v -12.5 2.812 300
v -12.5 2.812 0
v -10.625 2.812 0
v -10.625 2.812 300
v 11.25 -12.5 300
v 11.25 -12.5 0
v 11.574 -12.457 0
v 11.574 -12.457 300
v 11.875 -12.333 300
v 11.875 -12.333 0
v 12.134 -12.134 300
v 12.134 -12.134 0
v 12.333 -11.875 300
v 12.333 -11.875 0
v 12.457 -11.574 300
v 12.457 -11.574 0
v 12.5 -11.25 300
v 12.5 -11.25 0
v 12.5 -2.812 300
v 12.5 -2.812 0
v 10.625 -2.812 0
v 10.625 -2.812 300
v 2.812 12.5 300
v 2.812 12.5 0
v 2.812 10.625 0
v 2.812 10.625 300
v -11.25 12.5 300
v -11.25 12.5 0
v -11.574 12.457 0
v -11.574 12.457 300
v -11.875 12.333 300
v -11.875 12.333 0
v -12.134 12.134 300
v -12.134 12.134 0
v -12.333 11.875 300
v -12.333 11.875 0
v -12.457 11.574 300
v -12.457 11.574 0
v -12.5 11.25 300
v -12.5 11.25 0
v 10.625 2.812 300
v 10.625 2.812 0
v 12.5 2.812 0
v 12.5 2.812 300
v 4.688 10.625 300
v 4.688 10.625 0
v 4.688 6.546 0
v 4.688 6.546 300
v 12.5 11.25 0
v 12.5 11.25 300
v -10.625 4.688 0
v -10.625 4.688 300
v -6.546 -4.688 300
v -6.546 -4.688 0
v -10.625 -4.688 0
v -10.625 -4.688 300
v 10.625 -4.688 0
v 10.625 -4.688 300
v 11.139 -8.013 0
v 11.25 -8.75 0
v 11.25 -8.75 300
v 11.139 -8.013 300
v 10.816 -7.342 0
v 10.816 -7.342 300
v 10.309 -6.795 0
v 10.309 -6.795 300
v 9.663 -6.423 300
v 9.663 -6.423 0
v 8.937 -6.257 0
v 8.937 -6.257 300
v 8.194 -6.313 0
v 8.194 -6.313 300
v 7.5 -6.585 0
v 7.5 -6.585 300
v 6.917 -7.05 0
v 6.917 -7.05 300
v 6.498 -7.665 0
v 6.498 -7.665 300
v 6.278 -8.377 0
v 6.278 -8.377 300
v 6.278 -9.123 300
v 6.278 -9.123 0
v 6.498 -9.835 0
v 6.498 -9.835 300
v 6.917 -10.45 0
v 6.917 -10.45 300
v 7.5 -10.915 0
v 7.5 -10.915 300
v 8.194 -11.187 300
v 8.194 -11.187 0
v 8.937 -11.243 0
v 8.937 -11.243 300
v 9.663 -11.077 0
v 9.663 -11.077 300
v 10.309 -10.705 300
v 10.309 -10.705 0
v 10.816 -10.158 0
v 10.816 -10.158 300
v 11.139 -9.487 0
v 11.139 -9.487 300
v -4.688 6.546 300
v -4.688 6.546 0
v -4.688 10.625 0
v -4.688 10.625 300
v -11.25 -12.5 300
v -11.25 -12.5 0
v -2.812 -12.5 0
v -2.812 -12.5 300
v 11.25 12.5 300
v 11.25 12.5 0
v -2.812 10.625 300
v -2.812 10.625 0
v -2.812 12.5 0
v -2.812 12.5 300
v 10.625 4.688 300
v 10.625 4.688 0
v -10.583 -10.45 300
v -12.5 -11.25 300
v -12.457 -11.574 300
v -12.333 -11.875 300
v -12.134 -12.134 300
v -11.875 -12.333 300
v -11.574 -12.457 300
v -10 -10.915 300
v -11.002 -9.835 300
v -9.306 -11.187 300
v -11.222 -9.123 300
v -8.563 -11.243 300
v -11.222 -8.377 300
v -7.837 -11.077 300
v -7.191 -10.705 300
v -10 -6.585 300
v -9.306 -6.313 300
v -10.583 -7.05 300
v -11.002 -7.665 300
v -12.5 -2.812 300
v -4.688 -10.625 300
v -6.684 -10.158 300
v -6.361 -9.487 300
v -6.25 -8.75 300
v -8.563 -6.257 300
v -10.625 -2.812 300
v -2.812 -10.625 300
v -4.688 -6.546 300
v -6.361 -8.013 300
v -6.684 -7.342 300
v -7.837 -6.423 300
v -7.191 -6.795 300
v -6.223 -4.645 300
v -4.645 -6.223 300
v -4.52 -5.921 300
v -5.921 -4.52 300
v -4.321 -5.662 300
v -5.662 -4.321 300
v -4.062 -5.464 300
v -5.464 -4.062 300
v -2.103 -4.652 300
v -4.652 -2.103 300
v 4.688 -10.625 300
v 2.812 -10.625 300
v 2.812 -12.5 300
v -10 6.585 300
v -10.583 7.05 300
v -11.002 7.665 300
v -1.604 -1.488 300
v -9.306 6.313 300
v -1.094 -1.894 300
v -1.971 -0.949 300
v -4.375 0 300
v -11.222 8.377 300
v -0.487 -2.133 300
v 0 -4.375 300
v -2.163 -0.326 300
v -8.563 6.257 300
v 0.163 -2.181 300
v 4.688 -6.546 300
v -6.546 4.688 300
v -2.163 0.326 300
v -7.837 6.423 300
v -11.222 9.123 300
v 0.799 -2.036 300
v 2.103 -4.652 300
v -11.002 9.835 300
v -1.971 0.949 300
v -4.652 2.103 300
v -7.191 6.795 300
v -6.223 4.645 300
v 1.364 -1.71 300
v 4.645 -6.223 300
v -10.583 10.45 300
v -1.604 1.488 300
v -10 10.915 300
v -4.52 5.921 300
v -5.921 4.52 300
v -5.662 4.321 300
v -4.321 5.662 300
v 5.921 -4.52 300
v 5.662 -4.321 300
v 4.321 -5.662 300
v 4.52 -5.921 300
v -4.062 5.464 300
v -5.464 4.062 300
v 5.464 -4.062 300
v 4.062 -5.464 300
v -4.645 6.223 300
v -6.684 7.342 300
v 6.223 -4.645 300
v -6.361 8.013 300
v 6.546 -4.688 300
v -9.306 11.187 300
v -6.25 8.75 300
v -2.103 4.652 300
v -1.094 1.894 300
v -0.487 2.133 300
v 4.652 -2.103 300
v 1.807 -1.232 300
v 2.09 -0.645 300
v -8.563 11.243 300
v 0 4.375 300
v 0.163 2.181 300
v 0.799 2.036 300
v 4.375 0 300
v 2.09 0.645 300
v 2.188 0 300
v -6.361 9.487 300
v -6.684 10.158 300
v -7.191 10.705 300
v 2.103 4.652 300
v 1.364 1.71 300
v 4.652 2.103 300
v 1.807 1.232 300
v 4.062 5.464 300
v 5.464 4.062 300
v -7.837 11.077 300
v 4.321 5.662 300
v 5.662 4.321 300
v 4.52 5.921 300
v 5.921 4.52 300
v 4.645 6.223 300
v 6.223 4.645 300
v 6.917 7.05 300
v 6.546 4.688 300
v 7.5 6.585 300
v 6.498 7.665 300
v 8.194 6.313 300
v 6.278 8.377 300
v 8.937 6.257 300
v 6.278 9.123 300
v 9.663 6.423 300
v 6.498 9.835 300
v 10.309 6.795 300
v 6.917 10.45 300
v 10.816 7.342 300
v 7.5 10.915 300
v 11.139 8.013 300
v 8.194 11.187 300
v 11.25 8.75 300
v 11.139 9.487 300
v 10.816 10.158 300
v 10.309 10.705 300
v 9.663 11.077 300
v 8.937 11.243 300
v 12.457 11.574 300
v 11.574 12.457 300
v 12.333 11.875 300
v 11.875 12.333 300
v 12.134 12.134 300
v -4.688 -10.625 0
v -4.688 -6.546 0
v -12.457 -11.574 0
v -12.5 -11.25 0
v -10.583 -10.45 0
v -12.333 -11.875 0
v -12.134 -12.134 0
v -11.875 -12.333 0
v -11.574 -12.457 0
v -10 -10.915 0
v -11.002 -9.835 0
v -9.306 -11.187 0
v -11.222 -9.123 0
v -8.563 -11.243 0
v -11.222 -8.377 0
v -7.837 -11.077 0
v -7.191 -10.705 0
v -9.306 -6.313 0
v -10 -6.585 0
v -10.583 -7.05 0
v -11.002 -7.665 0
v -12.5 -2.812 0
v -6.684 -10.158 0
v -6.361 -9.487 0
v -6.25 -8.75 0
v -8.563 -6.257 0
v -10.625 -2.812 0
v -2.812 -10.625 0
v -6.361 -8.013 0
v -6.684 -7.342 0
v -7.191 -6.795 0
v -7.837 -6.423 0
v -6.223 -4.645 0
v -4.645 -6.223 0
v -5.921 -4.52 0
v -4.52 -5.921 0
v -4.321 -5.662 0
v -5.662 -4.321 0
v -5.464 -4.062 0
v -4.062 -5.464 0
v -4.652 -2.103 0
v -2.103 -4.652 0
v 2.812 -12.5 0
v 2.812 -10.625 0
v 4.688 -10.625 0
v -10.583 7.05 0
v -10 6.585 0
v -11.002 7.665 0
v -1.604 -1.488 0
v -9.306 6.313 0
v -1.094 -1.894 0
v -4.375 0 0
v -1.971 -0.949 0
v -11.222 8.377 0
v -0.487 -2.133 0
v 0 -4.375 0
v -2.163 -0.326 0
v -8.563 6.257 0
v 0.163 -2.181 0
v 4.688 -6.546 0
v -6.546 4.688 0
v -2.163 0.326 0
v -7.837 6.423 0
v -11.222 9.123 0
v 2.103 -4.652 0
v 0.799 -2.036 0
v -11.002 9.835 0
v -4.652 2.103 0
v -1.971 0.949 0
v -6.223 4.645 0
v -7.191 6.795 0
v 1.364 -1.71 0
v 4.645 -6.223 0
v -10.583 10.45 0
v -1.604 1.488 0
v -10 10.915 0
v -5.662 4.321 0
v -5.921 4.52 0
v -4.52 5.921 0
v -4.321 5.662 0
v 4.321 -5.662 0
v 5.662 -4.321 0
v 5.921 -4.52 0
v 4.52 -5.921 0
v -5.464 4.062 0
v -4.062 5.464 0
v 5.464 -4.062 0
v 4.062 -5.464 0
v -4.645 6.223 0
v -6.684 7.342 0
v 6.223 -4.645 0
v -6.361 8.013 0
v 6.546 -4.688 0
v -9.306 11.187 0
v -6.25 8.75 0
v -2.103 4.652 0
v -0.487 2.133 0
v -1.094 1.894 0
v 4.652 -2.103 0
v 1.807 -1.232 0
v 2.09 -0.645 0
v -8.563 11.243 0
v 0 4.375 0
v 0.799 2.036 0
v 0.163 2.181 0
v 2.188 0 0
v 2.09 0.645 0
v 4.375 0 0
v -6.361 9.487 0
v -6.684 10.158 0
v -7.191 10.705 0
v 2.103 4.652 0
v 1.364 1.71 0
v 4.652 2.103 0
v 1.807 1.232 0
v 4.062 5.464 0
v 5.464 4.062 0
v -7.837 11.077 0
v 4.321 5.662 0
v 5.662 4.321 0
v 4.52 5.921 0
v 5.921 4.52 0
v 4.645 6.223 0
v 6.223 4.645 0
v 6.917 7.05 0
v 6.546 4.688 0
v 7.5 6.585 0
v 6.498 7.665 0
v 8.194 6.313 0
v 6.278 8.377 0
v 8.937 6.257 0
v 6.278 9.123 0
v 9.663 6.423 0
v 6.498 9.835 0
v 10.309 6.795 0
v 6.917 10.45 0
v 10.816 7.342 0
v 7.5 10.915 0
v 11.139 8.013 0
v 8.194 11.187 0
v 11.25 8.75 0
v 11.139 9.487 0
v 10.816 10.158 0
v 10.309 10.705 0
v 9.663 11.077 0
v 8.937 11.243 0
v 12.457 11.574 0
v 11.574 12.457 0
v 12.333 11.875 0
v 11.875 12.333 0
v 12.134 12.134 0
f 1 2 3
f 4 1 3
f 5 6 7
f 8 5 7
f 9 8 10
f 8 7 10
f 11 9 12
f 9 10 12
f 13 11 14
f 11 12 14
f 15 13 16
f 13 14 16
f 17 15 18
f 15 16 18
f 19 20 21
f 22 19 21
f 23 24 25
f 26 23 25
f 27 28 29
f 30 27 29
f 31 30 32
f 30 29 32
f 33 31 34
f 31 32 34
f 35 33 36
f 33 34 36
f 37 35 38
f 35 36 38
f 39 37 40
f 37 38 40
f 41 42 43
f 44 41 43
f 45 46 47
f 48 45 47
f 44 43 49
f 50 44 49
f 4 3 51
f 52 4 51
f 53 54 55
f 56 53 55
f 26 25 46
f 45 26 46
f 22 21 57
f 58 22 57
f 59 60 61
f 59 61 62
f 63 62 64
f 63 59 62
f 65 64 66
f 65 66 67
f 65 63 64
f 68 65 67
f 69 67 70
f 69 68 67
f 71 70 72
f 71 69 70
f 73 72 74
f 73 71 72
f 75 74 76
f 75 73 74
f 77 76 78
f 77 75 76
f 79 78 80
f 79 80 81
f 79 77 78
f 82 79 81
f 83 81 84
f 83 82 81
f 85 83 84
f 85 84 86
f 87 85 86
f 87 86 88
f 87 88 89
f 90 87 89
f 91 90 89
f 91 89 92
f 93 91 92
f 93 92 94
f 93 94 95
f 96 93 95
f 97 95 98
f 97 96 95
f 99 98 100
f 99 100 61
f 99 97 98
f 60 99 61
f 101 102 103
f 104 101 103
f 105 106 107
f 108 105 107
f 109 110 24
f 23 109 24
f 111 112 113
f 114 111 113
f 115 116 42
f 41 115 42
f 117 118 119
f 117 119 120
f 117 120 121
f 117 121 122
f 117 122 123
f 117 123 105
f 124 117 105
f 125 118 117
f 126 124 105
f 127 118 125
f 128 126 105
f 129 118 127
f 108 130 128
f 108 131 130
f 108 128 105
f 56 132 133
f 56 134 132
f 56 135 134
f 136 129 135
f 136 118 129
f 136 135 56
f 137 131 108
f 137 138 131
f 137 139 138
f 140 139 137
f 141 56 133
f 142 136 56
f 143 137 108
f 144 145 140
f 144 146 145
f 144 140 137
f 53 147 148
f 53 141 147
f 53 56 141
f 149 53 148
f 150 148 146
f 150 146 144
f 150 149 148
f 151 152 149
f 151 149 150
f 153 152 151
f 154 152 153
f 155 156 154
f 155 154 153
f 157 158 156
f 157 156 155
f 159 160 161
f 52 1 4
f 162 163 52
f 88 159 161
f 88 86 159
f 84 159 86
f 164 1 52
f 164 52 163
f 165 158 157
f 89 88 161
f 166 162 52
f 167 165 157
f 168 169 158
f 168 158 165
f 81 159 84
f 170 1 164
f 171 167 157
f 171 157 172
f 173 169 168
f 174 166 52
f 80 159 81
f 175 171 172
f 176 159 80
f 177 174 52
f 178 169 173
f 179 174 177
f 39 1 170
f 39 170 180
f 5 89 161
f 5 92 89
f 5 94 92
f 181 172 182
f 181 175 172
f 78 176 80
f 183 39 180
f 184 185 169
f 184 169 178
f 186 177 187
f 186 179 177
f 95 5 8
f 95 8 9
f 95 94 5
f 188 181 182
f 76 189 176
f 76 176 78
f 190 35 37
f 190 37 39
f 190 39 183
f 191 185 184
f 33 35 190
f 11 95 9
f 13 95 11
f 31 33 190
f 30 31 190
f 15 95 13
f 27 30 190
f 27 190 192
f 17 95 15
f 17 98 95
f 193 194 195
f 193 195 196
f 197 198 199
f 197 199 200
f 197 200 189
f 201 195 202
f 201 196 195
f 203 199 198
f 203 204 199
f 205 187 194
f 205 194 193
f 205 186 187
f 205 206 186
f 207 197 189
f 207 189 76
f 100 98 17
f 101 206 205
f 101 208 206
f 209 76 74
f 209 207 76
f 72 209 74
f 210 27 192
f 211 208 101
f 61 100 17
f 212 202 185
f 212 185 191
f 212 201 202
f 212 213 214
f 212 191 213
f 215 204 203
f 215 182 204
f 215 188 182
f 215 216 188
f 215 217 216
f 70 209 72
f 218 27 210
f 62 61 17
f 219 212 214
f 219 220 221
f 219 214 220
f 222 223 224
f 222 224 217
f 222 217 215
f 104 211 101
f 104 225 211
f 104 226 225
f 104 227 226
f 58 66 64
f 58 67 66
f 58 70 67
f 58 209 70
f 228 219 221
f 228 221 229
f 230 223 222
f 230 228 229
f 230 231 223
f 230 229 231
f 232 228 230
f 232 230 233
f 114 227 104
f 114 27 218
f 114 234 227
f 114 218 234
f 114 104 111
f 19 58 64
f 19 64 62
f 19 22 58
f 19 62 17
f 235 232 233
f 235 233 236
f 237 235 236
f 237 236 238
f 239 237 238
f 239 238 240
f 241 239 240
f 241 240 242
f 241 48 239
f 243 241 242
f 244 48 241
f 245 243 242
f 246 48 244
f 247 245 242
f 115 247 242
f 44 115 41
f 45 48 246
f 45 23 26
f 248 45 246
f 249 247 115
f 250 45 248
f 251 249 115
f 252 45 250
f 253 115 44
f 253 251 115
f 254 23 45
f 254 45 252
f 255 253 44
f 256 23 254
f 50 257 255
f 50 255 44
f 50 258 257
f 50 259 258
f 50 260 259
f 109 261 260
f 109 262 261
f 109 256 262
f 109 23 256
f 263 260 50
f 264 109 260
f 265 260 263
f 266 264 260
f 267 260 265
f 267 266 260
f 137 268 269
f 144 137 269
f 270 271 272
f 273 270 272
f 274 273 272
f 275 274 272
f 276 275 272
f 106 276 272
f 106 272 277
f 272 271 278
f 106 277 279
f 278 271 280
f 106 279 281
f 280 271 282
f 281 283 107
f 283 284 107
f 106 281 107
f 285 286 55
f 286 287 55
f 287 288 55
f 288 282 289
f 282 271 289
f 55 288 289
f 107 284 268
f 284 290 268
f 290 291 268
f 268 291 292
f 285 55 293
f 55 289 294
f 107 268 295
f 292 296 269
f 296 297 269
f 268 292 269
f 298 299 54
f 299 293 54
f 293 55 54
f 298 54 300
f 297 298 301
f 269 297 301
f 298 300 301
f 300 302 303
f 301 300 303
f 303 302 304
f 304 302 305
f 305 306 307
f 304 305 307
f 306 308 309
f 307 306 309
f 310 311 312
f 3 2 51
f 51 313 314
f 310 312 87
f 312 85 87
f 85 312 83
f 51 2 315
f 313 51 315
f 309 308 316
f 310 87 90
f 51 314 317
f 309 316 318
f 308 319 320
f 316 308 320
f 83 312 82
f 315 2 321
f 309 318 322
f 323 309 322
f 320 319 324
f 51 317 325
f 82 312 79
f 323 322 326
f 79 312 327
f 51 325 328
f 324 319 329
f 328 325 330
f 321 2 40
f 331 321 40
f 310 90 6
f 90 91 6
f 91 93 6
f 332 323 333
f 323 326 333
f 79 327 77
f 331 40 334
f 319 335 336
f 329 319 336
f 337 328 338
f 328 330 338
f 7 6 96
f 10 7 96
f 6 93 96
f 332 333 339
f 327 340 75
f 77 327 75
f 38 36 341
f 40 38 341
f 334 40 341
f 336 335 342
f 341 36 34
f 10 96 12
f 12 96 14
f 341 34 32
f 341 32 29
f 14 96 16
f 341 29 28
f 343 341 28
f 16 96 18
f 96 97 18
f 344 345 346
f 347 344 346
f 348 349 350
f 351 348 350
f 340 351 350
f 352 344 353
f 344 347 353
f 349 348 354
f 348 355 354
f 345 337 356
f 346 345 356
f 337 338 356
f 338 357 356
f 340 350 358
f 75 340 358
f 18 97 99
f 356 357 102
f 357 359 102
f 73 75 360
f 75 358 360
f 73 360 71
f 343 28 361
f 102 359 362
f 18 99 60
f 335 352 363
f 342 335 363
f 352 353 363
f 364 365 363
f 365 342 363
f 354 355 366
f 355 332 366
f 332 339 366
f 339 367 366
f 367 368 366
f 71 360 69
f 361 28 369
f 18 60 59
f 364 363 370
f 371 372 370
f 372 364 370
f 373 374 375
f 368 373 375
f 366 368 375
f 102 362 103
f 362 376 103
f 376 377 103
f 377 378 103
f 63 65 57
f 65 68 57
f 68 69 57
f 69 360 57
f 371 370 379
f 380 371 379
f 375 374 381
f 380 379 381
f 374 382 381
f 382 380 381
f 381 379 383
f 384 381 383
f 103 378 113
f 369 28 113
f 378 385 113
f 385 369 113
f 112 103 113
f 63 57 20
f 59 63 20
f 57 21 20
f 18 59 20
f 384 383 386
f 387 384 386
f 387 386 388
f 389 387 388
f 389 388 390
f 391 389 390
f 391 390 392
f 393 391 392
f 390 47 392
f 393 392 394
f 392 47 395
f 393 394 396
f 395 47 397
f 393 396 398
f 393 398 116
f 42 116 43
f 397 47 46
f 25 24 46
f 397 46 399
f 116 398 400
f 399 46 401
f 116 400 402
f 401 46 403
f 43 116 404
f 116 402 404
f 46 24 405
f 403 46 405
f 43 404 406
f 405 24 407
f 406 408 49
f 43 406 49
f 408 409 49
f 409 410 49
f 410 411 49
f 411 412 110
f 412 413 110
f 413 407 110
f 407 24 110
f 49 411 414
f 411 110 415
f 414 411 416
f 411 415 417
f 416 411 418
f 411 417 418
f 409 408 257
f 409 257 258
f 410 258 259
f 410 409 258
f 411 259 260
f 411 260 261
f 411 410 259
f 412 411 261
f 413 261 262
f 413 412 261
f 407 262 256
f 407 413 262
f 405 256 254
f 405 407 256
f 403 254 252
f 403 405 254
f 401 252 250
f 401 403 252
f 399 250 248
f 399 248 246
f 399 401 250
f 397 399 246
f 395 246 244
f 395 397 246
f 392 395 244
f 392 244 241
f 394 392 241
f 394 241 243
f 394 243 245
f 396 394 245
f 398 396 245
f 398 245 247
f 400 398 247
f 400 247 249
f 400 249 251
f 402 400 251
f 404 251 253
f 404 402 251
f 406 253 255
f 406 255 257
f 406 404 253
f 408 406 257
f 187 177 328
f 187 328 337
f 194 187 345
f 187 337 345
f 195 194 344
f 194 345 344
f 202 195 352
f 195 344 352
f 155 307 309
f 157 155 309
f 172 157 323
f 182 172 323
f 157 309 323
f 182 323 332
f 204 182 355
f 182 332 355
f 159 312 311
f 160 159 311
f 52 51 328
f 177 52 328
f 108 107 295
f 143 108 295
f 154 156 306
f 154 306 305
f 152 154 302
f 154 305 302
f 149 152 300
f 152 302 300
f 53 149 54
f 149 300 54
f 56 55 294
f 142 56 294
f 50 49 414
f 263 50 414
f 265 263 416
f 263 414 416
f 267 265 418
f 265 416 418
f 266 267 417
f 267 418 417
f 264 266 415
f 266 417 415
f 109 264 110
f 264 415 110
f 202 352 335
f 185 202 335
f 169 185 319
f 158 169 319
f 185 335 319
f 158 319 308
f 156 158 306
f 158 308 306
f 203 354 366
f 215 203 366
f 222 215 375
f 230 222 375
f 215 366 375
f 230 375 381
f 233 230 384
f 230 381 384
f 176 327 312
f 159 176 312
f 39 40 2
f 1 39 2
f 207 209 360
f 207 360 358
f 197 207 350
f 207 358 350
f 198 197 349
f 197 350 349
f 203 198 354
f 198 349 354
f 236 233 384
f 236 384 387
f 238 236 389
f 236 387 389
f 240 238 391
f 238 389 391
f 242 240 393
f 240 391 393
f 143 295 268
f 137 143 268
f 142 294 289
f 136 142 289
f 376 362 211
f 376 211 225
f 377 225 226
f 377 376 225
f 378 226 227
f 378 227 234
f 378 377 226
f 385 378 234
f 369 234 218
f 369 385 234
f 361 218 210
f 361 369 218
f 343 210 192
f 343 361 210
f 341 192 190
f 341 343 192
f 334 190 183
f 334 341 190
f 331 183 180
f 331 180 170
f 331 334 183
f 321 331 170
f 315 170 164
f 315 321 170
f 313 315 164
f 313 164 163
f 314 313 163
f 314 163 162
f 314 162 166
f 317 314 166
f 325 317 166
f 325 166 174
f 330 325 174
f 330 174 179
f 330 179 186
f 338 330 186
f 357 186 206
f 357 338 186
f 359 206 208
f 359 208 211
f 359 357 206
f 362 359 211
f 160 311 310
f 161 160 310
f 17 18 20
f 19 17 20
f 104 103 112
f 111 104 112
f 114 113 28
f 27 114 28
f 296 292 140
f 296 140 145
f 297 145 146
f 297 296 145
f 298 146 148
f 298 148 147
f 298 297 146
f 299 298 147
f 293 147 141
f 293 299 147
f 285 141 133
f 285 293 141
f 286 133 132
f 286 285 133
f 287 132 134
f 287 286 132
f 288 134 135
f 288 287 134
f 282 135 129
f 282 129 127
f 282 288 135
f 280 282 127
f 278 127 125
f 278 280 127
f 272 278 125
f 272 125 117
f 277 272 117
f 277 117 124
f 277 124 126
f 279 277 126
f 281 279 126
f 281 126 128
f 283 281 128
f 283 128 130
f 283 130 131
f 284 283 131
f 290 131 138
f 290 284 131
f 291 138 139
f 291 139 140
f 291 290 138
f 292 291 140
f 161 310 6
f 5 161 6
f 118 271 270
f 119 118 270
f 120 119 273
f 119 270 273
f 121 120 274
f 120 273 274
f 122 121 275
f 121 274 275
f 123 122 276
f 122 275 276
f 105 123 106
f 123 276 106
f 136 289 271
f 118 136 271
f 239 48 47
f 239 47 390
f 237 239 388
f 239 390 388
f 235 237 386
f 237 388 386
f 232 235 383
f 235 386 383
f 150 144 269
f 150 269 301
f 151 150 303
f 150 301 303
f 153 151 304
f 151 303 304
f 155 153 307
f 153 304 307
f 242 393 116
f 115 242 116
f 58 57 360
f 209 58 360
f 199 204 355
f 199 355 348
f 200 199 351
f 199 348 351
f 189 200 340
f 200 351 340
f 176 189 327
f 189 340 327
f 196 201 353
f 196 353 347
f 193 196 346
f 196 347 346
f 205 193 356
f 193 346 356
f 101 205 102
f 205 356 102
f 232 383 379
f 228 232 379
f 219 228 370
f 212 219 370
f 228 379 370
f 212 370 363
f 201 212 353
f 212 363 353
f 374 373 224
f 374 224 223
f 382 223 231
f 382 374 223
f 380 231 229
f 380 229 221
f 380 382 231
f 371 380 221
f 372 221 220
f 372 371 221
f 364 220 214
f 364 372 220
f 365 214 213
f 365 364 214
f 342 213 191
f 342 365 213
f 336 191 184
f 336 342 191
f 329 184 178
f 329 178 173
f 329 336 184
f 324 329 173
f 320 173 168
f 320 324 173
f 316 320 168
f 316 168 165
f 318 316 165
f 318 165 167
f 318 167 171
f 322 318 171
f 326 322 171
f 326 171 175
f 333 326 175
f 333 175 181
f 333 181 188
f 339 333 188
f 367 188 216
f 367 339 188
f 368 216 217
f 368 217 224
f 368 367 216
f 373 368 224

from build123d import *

# Parameters (mm, degrees)
SKETCH1_R           = 2.5
SKETCH1_R_2         = 2.1875
BOSS_EXTRUDE1_DEPTH = 300


with BuildPart() as part:
    # Sketch1 → Boss-Extrude1 (new body)
    with BuildSketch(Plane.XY):
        with BuildLine():
            Line((-12.5, 11.25), (-12.5, 2.8125))
            Line((-12.5, 2.8125), (-10.625, 2.8125))
            Line((-10.625, 2.8125), (-10.625, 4.6875))
            Line((-10.625, 4.6875), (-6.546075349, 4.6875))
            ThreePointArc((-6.546075349, 4.6875), (-5.921075349, 4.520031755), (-5.463543594, 4.0625))
            ThreePointArc((-5.463543594, 4.0625), (-4.375, 0), (-5.463543594, -4.0625))
            ThreePointArc((-5.463543594, -4.0625), (-5.921075349, -4.520031755), (-6.546075349, -4.6875))
            Line((-6.546075349, -4.6875), (-10.625, -4.6875))
            Line((-10.625, -4.6875), (-10.625, -2.8125))
            Line((-10.625, -2.8125), (-12.5, -2.8125))
            Line((-12.5, -2.8125), (-12.5, -11.25))
            ThreePointArc((-12.5, -11.25), (-12.133883476, -12.133883476), (-11.25, -12.5))
            Line((-11.25, -12.5), (-2.8125, -12.5))
            Line((-2.8125, -12.5), (-2.8125, -10.625))
            Line((-2.8125, -10.625), (-4.6875, -10.625))
            Line((-4.6875, -10.625), (-4.6875, -6.546075349))
            ThreePointArc((-4.6875, -6.546075349), (-4.520031755, -5.921075349), (-4.0625, -5.463543594))
            ThreePointArc((-4.0625, -5.463543594), (0, -4.375), (4.0625, -5.463543594))
            ThreePointArc((4.0625, -5.463543594), (4.520031755, -5.921075349), (4.6875, -6.546075349))
            Line((4.6875, -6.546075349), (4.6875, -10.625))
            Line((4.6875, -10.625), (2.8125, -10.625))
            Line((2.8125, -10.625), (2.8125, -12.5))
            Line((2.8125, -12.5), (11.25, -12.5))
            ThreePointArc((11.25, -12.5), (12.133883476, -12.133883476), (12.5, -11.25))
            Line((12.5, -11.25), (12.5, -2.8125))
            Line((12.5, -2.8125), (10.625, -2.8125))
            Line((10.625, -2.8125), (10.625, -4.6875))
            Line((10.625, -4.6875), (6.546075349, -4.6875))
            ThreePointArc((6.546075349, -4.6875), (5.921075349, -4.520031755), (5.463543594, -4.0625))
            ThreePointArc((5.463543594, -4.0625), (4.375, 0), (5.463543594, 4.0625))
            ThreePointArc((5.463543594, 4.0625), (5.921075349, 4.520031755), (6.546075349, 4.6875))
            Line((6.546075349, 4.6875), (10.625, 4.6875))
            Line((10.625, 4.6875), (10.625, 2.8125))
            Line((10.625, 2.8125), (12.5, 2.8125))
            Line((12.5, 2.8125), (12.5, 11.25))
            ThreePointArc((12.5, 11.25), (12.133883476, 12.133883476), (11.25, 12.5))
            Line((11.25, 12.5), (2.8125, 12.5))
            Line((2.8125, 12.5), (2.8125, 10.625))
            Line((2.8125, 10.625), (4.6875, 10.625))
            Line((4.6875, 10.625), (4.6875, 6.546075349))
            ThreePointArc((4.6875, 6.546075349), (4.520031755, 5.921075349), (4.0625, 5.463543594))
            ThreePointArc((4.0625, 5.463543594), (0, 4.375), (-4.0625, 5.463543594))
            ThreePointArc((-4.0625, 5.463543594), (-4.520031755, 5.921075349), (-4.6875, 6.546075349))
            Line((-4.6875, 6.546075349), (-4.6875, 10.625))
            Line((-4.6875, 10.625), (-2.8125, 10.625))
            Line((-2.8125, 10.625), (-2.8125, 12.5))
            Line((-2.8125, 12.5), (-11.25, 12.5))
            ThreePointArc((-11.25, 12.5), (-12.133883476, 12.133883476), (-12.5, 11.25))
        make_face()
        with Locations((-8.75, -8.75)):
            Circle(SKETCH1_R, mode=Mode.SUBTRACT)
        with Locations((8.75, -8.75)):
            Circle(SKETCH1_R, mode=Mode.SUBTRACT)
        with Locations((8.75, 8.75)):
            Circle(SKETCH1_R, mode=Mode.SUBTRACT)
        Circle(SKETCH1_R_2, mode=Mode.SUBTRACT)
        with Locations((-8.75, 8.75)):
            Circle(SKETCH1_R, mode=Mode.SUBTRACT)
    extrude(amount=BOSS_EXTRUDE1_DEPTH)


solid = part.part
